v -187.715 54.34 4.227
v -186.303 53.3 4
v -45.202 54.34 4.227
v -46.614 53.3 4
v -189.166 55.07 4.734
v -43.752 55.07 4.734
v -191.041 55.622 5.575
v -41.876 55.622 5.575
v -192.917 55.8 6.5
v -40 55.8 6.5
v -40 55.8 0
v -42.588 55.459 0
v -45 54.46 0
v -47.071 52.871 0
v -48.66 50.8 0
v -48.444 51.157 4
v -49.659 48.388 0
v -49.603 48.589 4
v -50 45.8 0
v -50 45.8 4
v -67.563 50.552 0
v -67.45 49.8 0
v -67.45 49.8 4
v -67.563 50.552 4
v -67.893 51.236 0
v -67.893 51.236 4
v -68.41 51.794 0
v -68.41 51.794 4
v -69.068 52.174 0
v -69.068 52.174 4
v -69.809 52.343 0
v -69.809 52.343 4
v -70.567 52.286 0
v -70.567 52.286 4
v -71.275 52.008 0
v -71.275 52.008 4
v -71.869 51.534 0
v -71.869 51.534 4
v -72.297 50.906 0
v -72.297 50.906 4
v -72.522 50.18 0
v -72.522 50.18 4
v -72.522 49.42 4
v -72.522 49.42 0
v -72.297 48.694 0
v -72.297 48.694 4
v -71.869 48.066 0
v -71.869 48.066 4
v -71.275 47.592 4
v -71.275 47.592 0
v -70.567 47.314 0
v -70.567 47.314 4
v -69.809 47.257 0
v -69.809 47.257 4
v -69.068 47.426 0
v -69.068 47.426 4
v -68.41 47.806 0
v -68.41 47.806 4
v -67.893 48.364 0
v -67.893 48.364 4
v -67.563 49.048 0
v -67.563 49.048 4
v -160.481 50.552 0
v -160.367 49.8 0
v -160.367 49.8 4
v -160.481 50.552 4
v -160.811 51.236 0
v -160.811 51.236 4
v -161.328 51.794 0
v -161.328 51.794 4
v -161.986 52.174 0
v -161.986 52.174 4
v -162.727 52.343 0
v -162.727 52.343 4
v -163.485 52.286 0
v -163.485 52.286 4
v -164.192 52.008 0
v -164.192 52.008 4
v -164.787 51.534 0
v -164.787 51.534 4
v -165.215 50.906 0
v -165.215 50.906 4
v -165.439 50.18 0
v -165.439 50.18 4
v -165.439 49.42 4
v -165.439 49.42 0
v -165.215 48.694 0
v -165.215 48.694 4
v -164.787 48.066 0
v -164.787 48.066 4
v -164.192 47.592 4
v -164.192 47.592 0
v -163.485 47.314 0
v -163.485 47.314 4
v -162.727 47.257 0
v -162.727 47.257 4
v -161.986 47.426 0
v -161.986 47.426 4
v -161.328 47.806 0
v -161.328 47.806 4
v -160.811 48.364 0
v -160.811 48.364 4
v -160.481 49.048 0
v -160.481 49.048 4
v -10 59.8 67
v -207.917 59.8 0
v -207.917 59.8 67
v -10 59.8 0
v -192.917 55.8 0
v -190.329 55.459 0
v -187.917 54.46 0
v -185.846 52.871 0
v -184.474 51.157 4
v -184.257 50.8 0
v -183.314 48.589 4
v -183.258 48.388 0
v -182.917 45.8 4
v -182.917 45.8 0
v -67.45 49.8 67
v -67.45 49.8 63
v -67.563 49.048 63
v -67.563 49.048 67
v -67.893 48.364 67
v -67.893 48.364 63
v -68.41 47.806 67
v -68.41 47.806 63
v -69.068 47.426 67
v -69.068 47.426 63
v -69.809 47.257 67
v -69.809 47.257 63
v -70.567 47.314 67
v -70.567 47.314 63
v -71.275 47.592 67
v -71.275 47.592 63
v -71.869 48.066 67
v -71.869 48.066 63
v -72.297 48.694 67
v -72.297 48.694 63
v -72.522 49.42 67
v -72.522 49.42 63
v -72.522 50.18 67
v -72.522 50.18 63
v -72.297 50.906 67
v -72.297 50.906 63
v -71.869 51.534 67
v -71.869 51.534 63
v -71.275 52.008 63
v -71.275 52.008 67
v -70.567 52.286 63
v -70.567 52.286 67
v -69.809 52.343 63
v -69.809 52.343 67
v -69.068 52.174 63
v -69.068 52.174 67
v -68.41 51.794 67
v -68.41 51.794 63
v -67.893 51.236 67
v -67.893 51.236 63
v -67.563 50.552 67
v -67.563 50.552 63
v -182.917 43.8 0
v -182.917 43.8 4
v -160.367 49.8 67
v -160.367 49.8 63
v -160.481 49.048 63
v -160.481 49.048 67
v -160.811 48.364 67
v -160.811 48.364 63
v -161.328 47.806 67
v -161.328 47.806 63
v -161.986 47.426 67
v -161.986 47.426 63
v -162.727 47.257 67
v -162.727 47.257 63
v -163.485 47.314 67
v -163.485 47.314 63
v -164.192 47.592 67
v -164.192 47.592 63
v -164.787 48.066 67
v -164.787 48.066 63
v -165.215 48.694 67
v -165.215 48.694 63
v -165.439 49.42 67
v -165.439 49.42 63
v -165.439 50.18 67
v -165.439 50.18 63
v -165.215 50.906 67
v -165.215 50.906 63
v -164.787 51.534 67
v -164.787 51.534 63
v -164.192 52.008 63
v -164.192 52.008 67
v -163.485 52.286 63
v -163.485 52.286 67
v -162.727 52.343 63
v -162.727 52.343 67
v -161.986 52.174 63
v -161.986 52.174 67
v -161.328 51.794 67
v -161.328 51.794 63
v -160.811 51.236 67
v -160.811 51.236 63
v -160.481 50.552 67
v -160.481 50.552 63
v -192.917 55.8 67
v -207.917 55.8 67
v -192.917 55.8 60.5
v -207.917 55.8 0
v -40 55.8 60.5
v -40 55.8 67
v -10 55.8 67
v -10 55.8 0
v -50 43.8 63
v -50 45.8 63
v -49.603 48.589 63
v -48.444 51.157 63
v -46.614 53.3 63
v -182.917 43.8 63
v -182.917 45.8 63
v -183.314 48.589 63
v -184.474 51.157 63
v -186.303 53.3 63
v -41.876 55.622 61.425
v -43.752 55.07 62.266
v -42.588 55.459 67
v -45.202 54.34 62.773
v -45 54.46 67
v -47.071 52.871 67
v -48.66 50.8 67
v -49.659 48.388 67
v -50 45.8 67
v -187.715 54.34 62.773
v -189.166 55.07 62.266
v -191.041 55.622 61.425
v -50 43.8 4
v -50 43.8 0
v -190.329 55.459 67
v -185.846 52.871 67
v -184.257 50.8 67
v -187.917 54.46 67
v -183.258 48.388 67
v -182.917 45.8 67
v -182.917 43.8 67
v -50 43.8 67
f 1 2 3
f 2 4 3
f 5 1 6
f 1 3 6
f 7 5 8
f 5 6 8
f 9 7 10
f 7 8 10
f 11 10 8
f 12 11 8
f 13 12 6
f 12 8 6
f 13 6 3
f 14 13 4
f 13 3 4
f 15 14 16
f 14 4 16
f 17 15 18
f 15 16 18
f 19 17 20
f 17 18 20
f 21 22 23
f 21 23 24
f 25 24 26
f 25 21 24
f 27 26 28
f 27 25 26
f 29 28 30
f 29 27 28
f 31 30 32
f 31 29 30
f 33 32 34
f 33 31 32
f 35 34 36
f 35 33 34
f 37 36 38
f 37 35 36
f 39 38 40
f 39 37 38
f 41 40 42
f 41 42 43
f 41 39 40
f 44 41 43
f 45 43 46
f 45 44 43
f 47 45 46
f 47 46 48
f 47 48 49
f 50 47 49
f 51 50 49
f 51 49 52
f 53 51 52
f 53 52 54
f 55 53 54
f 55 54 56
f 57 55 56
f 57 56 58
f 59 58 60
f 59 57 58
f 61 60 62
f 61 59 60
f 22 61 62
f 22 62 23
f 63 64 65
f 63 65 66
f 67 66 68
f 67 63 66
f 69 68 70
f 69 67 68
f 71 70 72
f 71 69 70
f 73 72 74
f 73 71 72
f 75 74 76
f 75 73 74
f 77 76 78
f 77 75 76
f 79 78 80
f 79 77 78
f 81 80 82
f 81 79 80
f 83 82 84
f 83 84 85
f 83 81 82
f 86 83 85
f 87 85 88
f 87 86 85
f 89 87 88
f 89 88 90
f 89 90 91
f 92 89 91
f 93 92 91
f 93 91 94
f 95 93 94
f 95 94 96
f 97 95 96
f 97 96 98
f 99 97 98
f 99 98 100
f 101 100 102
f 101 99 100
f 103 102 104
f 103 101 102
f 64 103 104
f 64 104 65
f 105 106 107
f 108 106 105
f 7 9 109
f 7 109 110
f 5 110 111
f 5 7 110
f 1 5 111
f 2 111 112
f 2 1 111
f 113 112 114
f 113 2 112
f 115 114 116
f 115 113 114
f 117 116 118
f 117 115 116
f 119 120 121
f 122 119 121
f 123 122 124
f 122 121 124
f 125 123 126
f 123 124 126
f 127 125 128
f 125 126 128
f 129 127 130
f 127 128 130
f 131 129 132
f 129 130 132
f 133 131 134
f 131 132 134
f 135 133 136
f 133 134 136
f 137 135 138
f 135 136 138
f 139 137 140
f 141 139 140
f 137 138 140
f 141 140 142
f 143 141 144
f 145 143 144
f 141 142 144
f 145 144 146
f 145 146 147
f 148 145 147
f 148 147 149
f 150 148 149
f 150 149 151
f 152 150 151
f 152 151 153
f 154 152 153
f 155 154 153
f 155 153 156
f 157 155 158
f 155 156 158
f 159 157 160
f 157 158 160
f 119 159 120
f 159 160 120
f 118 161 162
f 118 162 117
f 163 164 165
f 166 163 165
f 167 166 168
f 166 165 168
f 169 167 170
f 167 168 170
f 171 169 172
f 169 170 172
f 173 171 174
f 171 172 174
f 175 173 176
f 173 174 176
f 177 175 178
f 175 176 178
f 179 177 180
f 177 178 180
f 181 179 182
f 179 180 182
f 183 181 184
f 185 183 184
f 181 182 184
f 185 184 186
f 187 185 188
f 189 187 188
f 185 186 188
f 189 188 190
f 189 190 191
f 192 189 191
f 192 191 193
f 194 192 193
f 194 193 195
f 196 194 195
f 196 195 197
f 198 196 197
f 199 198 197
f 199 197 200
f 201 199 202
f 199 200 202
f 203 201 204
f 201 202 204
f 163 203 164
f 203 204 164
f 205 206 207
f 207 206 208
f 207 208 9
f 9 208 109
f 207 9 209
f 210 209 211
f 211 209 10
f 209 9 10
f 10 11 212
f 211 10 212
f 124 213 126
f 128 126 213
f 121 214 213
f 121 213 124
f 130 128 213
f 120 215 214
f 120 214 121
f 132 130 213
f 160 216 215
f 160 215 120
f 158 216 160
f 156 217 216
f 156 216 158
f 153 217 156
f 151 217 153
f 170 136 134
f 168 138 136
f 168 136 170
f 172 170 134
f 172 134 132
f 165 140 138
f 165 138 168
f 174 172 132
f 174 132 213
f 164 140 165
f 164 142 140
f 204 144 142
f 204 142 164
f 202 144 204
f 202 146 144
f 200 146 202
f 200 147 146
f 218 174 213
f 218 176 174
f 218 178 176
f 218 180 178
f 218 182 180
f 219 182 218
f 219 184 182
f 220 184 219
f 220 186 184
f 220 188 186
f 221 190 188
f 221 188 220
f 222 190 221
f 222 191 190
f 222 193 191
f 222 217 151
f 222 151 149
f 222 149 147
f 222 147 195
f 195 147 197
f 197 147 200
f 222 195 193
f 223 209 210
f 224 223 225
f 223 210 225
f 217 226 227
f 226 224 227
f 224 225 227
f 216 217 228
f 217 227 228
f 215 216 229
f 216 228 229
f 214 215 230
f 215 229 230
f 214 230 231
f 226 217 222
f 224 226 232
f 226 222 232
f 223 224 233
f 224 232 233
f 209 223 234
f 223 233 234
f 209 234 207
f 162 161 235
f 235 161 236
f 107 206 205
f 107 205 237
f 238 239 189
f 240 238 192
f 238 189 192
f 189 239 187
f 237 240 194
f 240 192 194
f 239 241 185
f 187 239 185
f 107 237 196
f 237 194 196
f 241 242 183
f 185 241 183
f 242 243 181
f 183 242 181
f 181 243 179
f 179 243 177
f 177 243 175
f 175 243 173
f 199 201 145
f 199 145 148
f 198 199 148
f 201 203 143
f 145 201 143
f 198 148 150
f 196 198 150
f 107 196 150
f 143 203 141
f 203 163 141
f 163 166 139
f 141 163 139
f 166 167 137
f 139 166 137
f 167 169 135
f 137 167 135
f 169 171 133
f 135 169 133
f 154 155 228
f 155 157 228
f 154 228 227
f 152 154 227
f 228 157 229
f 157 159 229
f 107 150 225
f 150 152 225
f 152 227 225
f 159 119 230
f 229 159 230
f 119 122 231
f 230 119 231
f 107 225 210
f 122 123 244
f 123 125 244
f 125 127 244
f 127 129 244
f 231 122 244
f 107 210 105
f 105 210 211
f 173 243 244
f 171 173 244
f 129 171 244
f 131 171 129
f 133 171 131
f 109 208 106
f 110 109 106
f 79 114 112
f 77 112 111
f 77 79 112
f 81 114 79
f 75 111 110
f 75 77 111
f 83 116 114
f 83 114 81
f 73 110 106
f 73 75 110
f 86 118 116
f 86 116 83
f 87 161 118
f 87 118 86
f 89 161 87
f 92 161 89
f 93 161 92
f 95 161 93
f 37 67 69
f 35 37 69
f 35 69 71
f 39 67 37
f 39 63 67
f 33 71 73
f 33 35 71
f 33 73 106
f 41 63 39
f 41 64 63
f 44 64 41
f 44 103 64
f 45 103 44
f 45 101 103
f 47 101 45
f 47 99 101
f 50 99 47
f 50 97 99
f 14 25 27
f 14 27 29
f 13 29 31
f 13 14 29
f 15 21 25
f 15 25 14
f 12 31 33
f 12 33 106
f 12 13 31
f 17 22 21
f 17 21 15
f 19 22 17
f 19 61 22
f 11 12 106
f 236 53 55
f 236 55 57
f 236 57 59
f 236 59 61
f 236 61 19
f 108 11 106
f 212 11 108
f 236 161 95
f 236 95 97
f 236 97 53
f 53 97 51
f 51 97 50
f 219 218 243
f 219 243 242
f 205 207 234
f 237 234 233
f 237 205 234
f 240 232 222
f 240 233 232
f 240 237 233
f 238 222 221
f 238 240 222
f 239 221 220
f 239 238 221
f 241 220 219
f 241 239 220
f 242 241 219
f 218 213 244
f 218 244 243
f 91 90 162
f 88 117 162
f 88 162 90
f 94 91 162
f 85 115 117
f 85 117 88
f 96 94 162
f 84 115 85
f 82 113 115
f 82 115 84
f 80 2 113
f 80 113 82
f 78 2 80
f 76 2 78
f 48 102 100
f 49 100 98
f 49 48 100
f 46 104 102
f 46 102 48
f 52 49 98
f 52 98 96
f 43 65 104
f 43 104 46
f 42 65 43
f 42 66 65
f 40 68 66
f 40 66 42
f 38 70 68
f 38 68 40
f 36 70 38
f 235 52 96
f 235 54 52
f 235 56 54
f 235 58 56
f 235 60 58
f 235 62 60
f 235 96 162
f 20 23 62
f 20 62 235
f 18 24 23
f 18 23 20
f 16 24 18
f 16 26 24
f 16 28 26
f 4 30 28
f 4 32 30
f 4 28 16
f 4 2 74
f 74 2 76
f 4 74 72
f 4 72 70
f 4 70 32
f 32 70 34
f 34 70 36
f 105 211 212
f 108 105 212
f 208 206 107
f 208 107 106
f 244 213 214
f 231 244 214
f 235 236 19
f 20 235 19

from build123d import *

# Parameters (mm, degrees)
SKETCH1_W           = 132.917449813
SKETCH1_H           = 12
SKETCH1_R           = 2.55
BOSS_EXTRUDE1_DEPTH = 4
SKETCH2_W           = 197.917449813
SKETCH2_H           = 67
BOSS_EXTRUDE2_DEPTH = 4
BOSS_EXTRUDE3_START = 4
SKETCH3_W           = 132.917449813
SKETCH3_H           = 12
SKETCH3_R           = 2.55
BOSS_EXTRUDE3_DEPTH = 4
FILLET1_R           = 10
FILLET2_R           = 2.5


with BuildPart() as part:
    # Sketch1 → Boss-Extrude1 (new body)
    with BuildSketch(Plane.XY):
        with Locations((-116.458724907, 49.8)):
            Rectangle(SKETCH1_W, SKETCH1_H)
        with Locations((-162.917449813, 49.8)):
            Circle(SKETCH1_R, mode=Mode.SUBTRACT)
        with Locations((-70, 49.8)):
            Circle(SKETCH1_R, mode=Mode.SUBTRACT)
    extrude(amount=BOSS_EXTRUDE1_DEPTH)

    # Sketch2 → Boss-Extrude2 (add)
    with BuildSketch(Plane(origin=(0, 55.8, 0), x_dir=(1, 0, 0), z_dir=(0, 1, 0))):
        with Locations((-108.958724907, -33.5)):
            Rectangle(SKETCH2_W, SKETCH2_H)
    extrude(amount=BOSS_EXTRUDE2_DEPTH)

    # Sketch3 → Boss-Extrude3 (add)
    with BuildSketch(Plane(origin=(0, 0, 67), x_dir=(-1, 0, 0), z_dir=(0, 0, -1)).offset(BOSS_EXTRUDE3_START)):
        with Locations((116.458724907, 49.8)):
            Rectangle(SKETCH3_W, SKETCH3_H)
        with Locations(Location((162.917449813, 49.8, 0), (0, 0, 180))):
            Circle(SKETCH3_R, mode=Mode.SUBTRACT)
        with Locations(Location((70, 49.8, 0), (0, 0, 180))):
            Circle(SKETCH3_R, mode=Mode.SUBTRACT)
    extrude(amount=-BOSS_EXTRUDE3_DEPTH)

    # Fillet1
    fillet1_edges = [part.edges().sort_by_distance(p)[0] for p in [
        (-182.917449813, 55.8, 65),
        (-50, 55.8, 65),
        (-182.917449813, 55.8, 2),
        (-50, 55.8, 2),
    ]]
    fillet(fillet1_edges, radius=FILLET1_R)

    # Fillet2
    fillet2_edges = [part.edges().sort_by_distance(p)[0] for p in [
        (-116.458724906, 55.8, 4),
        (-116.458724906, 55.8, 63),
    ]]
    fillet(fillet2_edges, radius=FILLET2_R)


solid = part.part
